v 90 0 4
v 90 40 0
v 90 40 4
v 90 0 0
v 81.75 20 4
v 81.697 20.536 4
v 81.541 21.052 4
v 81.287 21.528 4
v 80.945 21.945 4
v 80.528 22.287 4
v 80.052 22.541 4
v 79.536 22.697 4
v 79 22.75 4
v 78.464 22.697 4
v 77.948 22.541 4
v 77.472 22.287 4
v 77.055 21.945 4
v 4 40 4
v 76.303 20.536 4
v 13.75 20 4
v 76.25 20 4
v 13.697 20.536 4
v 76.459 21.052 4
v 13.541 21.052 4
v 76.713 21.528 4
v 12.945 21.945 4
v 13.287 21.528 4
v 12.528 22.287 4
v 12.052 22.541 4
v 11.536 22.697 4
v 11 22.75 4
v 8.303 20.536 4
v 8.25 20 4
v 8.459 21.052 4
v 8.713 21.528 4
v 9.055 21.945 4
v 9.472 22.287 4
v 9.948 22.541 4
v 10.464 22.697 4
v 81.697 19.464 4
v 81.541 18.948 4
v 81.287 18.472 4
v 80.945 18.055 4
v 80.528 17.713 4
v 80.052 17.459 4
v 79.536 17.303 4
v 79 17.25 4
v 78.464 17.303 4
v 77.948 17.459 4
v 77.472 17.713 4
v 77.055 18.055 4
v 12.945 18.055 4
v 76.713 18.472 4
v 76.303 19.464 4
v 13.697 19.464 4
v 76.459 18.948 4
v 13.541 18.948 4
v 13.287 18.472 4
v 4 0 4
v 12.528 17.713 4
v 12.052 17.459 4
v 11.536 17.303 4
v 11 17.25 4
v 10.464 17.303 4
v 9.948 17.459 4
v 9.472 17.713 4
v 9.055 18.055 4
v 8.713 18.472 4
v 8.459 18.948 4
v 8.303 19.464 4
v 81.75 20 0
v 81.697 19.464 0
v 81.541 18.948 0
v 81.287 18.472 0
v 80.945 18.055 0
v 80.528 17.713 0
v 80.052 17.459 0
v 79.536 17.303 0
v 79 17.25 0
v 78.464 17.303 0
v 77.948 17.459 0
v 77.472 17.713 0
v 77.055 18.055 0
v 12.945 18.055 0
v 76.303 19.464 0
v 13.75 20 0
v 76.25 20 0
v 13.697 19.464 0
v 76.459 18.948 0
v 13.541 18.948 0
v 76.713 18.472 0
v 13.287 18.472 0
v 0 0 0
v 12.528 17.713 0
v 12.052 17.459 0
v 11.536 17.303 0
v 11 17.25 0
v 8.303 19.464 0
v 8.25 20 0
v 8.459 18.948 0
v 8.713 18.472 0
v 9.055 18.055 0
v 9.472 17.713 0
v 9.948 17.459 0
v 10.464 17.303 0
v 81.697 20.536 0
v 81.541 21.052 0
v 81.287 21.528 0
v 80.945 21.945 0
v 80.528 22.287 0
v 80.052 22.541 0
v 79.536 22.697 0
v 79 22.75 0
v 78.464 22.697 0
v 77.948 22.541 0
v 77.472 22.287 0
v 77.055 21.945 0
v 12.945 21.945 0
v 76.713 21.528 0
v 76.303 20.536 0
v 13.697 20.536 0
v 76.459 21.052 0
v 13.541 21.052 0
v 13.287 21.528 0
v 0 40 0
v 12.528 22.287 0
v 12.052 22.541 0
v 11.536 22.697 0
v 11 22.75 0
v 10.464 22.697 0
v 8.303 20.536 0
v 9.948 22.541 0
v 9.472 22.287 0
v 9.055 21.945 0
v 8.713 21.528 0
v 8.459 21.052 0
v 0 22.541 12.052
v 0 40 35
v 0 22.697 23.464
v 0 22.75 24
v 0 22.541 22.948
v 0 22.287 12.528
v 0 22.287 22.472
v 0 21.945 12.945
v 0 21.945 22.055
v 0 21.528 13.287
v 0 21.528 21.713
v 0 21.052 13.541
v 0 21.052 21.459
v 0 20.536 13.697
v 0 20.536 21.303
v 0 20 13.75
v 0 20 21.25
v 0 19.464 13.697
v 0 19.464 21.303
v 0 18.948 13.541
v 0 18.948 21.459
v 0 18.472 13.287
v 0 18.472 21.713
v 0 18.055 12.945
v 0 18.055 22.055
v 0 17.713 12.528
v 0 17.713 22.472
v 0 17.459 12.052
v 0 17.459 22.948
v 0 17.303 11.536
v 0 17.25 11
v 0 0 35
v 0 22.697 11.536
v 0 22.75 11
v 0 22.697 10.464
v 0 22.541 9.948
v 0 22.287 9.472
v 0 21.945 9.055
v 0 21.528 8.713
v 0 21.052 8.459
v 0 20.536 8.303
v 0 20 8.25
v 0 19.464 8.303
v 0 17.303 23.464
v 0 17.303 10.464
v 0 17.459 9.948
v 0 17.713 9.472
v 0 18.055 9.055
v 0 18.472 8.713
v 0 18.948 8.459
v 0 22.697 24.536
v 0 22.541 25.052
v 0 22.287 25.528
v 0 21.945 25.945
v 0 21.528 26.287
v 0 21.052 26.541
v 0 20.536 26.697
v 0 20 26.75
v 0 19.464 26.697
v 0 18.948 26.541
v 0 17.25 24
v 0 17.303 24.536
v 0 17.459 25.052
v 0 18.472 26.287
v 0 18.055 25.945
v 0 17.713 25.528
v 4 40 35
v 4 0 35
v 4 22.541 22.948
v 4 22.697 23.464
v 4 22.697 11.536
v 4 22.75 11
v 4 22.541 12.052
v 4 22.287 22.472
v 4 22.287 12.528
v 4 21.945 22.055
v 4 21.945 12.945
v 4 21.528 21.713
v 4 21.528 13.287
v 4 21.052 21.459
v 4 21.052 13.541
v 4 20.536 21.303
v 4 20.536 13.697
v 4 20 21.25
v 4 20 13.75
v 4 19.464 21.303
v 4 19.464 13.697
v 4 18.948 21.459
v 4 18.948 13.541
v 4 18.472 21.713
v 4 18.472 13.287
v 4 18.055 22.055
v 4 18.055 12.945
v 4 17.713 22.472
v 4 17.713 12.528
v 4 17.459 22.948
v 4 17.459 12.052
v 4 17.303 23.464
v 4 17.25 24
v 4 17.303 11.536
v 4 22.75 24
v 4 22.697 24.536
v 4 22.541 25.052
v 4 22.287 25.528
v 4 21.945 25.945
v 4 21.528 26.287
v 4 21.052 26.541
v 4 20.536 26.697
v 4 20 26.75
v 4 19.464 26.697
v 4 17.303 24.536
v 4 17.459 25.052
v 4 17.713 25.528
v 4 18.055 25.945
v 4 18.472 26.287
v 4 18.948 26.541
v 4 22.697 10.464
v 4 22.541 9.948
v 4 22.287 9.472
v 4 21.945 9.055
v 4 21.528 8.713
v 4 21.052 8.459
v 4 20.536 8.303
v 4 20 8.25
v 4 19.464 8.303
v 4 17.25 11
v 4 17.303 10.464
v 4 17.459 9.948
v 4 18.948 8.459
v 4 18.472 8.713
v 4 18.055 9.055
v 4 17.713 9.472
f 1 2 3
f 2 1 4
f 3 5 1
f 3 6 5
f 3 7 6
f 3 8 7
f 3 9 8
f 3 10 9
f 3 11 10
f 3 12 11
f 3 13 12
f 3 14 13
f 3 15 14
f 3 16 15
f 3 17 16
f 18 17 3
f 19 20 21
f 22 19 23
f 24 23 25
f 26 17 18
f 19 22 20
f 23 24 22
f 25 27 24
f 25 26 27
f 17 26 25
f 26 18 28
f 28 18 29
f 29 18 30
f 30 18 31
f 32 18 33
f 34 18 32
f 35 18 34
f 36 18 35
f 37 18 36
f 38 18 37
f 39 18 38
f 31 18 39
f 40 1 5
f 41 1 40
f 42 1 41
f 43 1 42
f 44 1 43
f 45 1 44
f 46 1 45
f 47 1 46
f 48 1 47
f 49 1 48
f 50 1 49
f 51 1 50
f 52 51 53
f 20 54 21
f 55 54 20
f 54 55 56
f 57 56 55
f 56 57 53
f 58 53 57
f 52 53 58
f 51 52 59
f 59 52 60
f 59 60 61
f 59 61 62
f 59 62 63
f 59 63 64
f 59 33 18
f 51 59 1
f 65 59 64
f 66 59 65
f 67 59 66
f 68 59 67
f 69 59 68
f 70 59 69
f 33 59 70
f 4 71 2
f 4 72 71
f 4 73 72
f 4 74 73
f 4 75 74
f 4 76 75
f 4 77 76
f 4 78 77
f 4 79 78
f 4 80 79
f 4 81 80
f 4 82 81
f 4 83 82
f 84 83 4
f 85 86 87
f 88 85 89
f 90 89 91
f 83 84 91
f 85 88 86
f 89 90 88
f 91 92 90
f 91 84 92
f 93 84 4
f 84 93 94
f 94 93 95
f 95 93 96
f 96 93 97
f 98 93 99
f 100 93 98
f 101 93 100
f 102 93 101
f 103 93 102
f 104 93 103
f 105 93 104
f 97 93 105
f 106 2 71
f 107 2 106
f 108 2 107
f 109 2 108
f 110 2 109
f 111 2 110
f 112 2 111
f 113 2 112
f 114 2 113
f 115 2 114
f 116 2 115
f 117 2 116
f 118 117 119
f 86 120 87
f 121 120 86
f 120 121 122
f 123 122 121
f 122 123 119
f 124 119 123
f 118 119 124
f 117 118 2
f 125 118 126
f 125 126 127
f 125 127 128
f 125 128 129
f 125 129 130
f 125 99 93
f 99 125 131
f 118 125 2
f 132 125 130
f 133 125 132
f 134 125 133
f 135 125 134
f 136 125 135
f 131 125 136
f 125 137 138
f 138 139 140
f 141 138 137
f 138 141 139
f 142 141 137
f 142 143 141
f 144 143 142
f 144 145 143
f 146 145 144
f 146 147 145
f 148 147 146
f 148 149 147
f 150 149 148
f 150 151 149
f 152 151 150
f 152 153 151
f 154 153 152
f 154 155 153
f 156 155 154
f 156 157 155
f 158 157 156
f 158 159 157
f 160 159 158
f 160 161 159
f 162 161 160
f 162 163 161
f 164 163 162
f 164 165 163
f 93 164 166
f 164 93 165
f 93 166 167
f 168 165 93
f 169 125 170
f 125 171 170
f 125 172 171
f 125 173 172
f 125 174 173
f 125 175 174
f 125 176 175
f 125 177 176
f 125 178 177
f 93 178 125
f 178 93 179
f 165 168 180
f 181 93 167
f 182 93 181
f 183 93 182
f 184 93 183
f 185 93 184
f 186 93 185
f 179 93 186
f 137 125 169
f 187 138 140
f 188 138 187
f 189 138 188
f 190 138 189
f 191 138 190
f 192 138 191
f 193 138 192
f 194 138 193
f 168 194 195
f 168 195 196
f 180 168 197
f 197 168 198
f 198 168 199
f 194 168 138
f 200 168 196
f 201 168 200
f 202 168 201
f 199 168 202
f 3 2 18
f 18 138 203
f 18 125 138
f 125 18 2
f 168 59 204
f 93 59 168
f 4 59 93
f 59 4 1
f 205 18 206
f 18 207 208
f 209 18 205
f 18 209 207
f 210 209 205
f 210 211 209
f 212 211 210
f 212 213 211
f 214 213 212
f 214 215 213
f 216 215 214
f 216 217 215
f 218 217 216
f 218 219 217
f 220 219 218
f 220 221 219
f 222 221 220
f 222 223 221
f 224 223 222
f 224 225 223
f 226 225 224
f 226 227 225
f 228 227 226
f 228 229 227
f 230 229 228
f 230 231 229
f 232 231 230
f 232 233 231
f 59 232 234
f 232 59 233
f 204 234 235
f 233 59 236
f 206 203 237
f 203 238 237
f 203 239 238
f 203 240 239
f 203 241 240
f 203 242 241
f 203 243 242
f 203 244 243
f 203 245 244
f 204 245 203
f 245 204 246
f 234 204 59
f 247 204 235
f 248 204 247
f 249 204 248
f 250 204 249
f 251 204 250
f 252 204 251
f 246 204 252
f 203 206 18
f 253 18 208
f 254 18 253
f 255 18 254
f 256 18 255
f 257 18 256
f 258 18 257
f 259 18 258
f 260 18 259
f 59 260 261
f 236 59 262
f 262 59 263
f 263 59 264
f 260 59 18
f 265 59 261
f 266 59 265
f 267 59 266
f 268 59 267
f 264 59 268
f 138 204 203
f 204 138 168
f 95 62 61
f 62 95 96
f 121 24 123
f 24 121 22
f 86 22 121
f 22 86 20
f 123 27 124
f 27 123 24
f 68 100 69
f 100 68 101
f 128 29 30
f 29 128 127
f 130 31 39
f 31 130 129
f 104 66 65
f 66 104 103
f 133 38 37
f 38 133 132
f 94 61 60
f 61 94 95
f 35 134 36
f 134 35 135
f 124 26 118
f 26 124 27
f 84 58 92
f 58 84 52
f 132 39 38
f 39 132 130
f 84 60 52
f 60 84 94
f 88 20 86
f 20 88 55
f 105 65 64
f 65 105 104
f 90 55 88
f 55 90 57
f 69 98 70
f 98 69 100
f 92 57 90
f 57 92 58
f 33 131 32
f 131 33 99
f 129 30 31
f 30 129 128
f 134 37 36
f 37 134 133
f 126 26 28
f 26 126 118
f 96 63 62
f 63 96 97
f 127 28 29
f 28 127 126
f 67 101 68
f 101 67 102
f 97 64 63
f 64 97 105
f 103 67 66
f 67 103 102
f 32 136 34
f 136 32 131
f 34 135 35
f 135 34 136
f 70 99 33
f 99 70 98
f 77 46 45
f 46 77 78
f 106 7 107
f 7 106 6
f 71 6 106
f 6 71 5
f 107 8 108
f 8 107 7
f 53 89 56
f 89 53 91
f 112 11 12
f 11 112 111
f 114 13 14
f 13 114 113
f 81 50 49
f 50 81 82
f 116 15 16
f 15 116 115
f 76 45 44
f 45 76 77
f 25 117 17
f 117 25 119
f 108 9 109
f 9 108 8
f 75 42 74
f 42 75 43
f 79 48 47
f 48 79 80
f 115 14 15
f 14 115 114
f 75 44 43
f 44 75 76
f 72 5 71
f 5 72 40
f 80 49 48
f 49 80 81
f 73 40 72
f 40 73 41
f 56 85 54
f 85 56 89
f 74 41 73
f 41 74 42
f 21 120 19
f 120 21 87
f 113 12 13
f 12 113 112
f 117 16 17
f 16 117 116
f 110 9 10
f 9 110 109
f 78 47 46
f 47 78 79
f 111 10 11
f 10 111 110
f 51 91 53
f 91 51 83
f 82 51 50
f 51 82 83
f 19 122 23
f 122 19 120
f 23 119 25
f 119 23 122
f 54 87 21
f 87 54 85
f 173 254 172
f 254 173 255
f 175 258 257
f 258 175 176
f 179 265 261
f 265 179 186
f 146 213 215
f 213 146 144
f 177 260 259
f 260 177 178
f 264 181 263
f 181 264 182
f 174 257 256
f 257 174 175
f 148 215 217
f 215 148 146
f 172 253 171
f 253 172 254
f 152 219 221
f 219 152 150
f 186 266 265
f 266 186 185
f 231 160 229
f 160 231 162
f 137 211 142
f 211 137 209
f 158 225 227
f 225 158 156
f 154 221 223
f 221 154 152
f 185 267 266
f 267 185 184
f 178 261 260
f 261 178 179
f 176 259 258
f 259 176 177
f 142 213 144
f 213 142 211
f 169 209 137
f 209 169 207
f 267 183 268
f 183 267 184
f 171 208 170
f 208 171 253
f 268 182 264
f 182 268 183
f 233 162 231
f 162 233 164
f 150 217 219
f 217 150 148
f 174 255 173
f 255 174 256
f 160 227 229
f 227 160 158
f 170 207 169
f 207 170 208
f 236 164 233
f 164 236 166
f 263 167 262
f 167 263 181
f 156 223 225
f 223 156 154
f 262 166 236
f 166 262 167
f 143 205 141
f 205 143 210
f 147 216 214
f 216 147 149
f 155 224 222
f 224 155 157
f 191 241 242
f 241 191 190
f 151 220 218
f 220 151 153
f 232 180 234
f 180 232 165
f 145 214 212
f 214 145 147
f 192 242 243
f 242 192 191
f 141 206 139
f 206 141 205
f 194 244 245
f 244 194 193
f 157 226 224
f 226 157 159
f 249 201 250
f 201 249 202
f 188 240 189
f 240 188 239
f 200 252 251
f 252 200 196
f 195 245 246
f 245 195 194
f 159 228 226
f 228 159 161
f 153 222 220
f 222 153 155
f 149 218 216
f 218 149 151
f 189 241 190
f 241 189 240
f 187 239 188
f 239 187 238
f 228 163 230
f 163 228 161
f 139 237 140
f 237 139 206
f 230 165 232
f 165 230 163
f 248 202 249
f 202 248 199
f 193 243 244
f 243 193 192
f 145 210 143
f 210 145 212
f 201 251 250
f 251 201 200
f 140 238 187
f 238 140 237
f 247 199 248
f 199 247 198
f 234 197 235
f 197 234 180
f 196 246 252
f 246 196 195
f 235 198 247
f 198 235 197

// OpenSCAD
$fn = 32;

// ----------------------------------------------------------------------
// L-bracket: 90 x 40 x 35 mm
// ----------------------------------------------------------------------

// --- parameters (mm) ---
base_len = 90;            // horizontal leg, X
upright_h = 35;           // vertical leg, Z
flange_w = 40;            // bracket depth, Y
mat_t = 4;                // plate thickness
hole_d = 5.5;             // clearance for M5

module hole_z(px, py) {
  translate([px, py, -2.5]) cylinder(h = mat_t + 5, d = hole_d);
}
module hole_x(pz, py) {
  translate([-2.5, py, pz]) rotate([0, 90, 0]) cylinder(h = mat_t + 5, d = hole_d);
}

difference() {
  union() {
    /* horizontal leg */
    cube([base_len, flange_w, mat_t]);
    /* vertical leg, overlapping the corner block */
    cube([mat_t, flange_w, upright_h]);
  }
  hole_z(11, 20);
  hole_z(79, 20);
  hole_x(11, 20);
  hole_x(24, 20);
}
